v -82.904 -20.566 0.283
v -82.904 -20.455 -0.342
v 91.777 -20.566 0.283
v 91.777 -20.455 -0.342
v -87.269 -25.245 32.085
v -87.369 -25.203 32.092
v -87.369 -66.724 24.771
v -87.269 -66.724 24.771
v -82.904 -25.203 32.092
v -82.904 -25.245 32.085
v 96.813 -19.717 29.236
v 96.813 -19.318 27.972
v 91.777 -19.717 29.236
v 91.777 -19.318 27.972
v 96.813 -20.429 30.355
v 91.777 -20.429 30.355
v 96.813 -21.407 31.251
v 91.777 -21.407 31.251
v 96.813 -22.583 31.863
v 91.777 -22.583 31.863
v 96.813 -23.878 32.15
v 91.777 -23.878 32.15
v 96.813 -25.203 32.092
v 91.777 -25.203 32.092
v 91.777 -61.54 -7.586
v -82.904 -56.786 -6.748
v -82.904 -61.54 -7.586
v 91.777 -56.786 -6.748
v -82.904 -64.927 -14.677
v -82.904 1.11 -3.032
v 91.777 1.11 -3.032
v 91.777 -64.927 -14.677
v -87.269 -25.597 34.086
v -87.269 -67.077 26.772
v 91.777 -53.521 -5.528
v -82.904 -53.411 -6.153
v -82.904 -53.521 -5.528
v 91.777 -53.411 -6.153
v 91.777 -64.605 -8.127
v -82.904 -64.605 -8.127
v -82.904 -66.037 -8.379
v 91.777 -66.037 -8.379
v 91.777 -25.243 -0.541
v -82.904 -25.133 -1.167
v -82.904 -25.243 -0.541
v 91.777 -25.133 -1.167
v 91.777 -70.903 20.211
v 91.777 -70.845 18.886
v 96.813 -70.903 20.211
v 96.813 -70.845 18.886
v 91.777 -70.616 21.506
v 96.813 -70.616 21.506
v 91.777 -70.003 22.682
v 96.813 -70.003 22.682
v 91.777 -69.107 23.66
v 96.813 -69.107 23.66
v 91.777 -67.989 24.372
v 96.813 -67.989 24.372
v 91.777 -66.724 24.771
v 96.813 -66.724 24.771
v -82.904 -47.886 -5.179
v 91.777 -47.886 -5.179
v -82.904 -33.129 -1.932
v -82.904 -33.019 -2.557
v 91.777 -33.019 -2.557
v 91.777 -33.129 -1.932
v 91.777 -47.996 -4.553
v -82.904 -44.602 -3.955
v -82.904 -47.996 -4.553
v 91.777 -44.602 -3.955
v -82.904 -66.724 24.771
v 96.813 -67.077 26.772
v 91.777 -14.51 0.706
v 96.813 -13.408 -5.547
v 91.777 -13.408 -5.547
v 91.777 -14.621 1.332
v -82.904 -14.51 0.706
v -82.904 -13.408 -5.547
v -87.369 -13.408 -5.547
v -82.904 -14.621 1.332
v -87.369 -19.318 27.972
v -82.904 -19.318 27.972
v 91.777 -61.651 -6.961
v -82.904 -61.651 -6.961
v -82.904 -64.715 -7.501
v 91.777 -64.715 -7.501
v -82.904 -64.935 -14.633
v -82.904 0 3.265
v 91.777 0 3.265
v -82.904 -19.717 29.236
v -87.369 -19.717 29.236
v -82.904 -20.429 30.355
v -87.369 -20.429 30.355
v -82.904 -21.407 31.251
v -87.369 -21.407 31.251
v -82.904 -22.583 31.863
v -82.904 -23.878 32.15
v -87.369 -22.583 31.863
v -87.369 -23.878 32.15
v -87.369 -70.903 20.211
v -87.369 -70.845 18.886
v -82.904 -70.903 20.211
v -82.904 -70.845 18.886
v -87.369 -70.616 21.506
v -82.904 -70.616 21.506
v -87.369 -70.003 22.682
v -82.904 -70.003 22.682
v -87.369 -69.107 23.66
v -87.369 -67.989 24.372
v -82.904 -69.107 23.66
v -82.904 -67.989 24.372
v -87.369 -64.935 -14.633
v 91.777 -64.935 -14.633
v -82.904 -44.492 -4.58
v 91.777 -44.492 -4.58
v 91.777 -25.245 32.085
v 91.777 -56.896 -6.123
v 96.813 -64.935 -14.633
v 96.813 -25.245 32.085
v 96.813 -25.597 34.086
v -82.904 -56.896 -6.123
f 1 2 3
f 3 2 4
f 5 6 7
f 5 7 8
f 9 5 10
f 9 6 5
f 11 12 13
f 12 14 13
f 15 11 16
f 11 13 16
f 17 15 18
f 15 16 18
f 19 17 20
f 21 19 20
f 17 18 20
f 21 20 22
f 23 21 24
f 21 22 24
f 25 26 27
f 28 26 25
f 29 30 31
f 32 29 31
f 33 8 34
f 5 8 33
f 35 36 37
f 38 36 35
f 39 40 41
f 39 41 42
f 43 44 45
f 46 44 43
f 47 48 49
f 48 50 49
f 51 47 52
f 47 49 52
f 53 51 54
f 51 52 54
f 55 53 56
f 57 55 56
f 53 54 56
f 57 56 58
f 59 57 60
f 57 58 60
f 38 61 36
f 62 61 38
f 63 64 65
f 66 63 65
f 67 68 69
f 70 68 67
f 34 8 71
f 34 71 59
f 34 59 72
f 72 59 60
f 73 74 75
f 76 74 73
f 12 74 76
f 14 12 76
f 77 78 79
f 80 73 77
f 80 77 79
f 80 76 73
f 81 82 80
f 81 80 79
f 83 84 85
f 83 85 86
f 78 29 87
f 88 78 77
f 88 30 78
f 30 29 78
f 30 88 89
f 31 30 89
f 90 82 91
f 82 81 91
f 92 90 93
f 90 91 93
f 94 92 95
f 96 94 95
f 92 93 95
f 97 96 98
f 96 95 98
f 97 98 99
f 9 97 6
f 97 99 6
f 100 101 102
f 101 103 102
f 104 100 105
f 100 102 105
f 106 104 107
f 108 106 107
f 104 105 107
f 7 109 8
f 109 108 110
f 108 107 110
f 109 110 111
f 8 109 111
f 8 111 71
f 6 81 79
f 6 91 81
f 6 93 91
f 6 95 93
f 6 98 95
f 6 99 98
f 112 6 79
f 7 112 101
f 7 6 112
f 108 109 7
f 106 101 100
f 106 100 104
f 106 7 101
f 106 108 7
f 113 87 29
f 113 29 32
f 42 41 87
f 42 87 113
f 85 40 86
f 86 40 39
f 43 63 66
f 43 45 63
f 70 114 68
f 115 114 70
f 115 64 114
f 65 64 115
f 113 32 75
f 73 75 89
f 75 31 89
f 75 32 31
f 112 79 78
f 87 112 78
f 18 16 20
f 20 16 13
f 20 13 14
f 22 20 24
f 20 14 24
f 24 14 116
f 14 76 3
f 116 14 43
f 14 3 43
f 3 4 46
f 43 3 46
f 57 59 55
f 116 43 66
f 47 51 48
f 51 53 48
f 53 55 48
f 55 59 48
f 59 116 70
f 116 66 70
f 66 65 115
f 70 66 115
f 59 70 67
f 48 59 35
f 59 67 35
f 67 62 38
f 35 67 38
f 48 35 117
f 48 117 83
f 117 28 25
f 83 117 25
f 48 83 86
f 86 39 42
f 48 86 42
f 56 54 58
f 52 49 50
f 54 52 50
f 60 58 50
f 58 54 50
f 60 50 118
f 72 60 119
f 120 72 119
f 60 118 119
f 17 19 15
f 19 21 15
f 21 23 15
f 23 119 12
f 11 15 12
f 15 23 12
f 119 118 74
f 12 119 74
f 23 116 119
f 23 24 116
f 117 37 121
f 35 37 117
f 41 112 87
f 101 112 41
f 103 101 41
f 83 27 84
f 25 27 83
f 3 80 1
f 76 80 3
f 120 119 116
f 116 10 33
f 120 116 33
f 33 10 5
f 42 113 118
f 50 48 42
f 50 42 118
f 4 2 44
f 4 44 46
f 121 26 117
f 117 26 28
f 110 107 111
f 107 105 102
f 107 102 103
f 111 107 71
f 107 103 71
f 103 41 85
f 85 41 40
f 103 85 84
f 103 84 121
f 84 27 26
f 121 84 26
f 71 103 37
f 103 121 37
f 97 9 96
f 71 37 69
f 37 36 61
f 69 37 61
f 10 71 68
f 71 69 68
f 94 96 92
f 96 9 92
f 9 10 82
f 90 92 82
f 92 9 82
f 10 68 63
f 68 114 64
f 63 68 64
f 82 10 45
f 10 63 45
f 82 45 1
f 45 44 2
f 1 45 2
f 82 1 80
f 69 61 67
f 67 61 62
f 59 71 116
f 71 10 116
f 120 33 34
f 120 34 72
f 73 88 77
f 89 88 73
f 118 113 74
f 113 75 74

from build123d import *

# Parameters (mm, degrees)
F0_W          = 174.6804863214
F0_H          = 6.394301774
F1_DEPTH      = 67.056
F2_ANGLE      = 10
F3_W          = 174.6804863214
F3_H          = 6.0367527984
F3_H_2        = 3.3486538234
F3_H_3        = 4.6590082347
F3_H_4        = 3.4464076161
F3_H_5        = 3.4266933799
F3_H_6        = 3.1117796898
F4_DEPTH      = 0.635
F5_DEPTH      = 32.766
F5_DEPTH_BACK = 6.35
F6_R          = 5.08
F7_W          = 5.0366173964
F7_H          = 42.1194909459
F7_W_2        = 179.0462706704
F8_DEPTH      = 2.032


with BuildPart() as f1:
    # F0 (on Front) → F1 (new body)
    with BuildSketch(Plane.XZ):
        with Locations((4.4365723152, 0.0675924821)):
            Rectangle(F0_W, F0_H)
    extrude(amount=F1_DEPTH)


with BuildPart() as f1_1:
    # F2: moved
    add(f1.part.rotate(Axis((4.4365723152, 0, 3.2647433691), (1, 0, 0)), F2_ANGLE))

    # F3 (on face) → F4 (join)
    with BuildSketch(Plane(origin=(0, -0.5583039975, 3.1662993109), x_dir=(1, 0, 0), z_dir=(0, -0.1736481777, 0.984807753))):
        with Locations((4.4365723152, -17.1857467104)):
            Rectangle(F3_W, F3_H)
        with Locations((4.4365723152, -31.2867563517)):
            Rectangle(F3_W, F3_H_2)
        with Locations((4.4365723152, -27.2829253227)):
            Rectangle(F3_W, F3_H_3)
        with Locations((4.4365723152, -46.3344976306)):
            Rectangle(F3_W, F3_H_4)
        with Locations((4.4365723152, -55.3813166916)):
            Rectangle(F3_W, F3_H_5)
        with Locations((4.4365723152, -63.4787082672)):
            Rectangle(F3_W, F3_H_6)
    extrude(amount=F4_DEPTH)

    # F3 (on face) → F5 (join, two sides)
    with BuildSketch(Plane(origin=(0, -0.5583039975, 3.1662993109), x_dir=(1, 0, 0), z_dir=(0, -0.1736481777, 0.984807753))) as f5_sk:
        Polygon((-82.9036708456, -66.4890832634), (-82.9036708456, -65.0345981121), (-82.9036708456, -61.9228184223), (-82.9036708456, -57.0946633816), (-82.9036708456, -53.6679700017), (-82.9036708456, -48.0577014387), (-82.9036708456, -44.6112938225), (-82.9036708456, -36.0245257616), (-82.9036708456, -32.9610832634), (-82.9036708456, -29.61242944), (-82.9036708456, -24.9534212053), (-82.9036708456, -20.2041231096), (-82.9036708456, -14.1673703112), (-87.36910671, -14.1673703112), (-87.36910671, -66.4890832634), align=None)
        Polygon((91.7768154759, -61.9228184223), (91.7768154759, -65.0345981121), (91.7768154759, -66.4890832634), (96.8134328723, -66.4890832634), (96.8134328723, -14.1673703112), (91.7768154759, -14.1673703112), (91.7768154759, -20.2041231096), (91.7768154759, -24.9534212053), (91.7768154759, -29.61242944), (91.7768154759, -32.9610832634), (91.7768154759, -36.0245257616), (91.7768154759, -44.6112938225), (91.7768154759, -48.0577014387), (91.7768154759, -53.6679700017), (91.7768154759, -57.0946633816), align=None)
    extrude(amount=F5_DEPTH)
    extrude(f5_sk.sketch, amount=-F5_DEPTH_BACK)

    # F6
    f6_edges = [f1_1.edges().sort_by_distance(p)[0] for p in [
        (94.295124, -20.200196, 32.974372),
        (-85.136389, -20.200196, 32.974372),
        (-85.136389, -71.727025, 23.888802),
        (94.295124, -71.727025, 23.888802),
    ]]
    fillet(f6_edges, radius=F6_R)

    # F7 (on face) → F8 (join)
    with BuildSketch(Plane(origin=(0, -6.2480601869, 35.4345101461), x_dir=(1, 0, 0), z_dir=(0, -0.1736481777, 0.984807753))):
        with Locations((94.2951241741, -40.3493377905)):
            Rectangle(F7_W, F7_H)
        with Locations((2.2536801407, -40.3493377905)):
            Rectangle(F7_W_2, F7_H)
    extrude(amount=F8_DEPTH)


solid = f1_1.part
